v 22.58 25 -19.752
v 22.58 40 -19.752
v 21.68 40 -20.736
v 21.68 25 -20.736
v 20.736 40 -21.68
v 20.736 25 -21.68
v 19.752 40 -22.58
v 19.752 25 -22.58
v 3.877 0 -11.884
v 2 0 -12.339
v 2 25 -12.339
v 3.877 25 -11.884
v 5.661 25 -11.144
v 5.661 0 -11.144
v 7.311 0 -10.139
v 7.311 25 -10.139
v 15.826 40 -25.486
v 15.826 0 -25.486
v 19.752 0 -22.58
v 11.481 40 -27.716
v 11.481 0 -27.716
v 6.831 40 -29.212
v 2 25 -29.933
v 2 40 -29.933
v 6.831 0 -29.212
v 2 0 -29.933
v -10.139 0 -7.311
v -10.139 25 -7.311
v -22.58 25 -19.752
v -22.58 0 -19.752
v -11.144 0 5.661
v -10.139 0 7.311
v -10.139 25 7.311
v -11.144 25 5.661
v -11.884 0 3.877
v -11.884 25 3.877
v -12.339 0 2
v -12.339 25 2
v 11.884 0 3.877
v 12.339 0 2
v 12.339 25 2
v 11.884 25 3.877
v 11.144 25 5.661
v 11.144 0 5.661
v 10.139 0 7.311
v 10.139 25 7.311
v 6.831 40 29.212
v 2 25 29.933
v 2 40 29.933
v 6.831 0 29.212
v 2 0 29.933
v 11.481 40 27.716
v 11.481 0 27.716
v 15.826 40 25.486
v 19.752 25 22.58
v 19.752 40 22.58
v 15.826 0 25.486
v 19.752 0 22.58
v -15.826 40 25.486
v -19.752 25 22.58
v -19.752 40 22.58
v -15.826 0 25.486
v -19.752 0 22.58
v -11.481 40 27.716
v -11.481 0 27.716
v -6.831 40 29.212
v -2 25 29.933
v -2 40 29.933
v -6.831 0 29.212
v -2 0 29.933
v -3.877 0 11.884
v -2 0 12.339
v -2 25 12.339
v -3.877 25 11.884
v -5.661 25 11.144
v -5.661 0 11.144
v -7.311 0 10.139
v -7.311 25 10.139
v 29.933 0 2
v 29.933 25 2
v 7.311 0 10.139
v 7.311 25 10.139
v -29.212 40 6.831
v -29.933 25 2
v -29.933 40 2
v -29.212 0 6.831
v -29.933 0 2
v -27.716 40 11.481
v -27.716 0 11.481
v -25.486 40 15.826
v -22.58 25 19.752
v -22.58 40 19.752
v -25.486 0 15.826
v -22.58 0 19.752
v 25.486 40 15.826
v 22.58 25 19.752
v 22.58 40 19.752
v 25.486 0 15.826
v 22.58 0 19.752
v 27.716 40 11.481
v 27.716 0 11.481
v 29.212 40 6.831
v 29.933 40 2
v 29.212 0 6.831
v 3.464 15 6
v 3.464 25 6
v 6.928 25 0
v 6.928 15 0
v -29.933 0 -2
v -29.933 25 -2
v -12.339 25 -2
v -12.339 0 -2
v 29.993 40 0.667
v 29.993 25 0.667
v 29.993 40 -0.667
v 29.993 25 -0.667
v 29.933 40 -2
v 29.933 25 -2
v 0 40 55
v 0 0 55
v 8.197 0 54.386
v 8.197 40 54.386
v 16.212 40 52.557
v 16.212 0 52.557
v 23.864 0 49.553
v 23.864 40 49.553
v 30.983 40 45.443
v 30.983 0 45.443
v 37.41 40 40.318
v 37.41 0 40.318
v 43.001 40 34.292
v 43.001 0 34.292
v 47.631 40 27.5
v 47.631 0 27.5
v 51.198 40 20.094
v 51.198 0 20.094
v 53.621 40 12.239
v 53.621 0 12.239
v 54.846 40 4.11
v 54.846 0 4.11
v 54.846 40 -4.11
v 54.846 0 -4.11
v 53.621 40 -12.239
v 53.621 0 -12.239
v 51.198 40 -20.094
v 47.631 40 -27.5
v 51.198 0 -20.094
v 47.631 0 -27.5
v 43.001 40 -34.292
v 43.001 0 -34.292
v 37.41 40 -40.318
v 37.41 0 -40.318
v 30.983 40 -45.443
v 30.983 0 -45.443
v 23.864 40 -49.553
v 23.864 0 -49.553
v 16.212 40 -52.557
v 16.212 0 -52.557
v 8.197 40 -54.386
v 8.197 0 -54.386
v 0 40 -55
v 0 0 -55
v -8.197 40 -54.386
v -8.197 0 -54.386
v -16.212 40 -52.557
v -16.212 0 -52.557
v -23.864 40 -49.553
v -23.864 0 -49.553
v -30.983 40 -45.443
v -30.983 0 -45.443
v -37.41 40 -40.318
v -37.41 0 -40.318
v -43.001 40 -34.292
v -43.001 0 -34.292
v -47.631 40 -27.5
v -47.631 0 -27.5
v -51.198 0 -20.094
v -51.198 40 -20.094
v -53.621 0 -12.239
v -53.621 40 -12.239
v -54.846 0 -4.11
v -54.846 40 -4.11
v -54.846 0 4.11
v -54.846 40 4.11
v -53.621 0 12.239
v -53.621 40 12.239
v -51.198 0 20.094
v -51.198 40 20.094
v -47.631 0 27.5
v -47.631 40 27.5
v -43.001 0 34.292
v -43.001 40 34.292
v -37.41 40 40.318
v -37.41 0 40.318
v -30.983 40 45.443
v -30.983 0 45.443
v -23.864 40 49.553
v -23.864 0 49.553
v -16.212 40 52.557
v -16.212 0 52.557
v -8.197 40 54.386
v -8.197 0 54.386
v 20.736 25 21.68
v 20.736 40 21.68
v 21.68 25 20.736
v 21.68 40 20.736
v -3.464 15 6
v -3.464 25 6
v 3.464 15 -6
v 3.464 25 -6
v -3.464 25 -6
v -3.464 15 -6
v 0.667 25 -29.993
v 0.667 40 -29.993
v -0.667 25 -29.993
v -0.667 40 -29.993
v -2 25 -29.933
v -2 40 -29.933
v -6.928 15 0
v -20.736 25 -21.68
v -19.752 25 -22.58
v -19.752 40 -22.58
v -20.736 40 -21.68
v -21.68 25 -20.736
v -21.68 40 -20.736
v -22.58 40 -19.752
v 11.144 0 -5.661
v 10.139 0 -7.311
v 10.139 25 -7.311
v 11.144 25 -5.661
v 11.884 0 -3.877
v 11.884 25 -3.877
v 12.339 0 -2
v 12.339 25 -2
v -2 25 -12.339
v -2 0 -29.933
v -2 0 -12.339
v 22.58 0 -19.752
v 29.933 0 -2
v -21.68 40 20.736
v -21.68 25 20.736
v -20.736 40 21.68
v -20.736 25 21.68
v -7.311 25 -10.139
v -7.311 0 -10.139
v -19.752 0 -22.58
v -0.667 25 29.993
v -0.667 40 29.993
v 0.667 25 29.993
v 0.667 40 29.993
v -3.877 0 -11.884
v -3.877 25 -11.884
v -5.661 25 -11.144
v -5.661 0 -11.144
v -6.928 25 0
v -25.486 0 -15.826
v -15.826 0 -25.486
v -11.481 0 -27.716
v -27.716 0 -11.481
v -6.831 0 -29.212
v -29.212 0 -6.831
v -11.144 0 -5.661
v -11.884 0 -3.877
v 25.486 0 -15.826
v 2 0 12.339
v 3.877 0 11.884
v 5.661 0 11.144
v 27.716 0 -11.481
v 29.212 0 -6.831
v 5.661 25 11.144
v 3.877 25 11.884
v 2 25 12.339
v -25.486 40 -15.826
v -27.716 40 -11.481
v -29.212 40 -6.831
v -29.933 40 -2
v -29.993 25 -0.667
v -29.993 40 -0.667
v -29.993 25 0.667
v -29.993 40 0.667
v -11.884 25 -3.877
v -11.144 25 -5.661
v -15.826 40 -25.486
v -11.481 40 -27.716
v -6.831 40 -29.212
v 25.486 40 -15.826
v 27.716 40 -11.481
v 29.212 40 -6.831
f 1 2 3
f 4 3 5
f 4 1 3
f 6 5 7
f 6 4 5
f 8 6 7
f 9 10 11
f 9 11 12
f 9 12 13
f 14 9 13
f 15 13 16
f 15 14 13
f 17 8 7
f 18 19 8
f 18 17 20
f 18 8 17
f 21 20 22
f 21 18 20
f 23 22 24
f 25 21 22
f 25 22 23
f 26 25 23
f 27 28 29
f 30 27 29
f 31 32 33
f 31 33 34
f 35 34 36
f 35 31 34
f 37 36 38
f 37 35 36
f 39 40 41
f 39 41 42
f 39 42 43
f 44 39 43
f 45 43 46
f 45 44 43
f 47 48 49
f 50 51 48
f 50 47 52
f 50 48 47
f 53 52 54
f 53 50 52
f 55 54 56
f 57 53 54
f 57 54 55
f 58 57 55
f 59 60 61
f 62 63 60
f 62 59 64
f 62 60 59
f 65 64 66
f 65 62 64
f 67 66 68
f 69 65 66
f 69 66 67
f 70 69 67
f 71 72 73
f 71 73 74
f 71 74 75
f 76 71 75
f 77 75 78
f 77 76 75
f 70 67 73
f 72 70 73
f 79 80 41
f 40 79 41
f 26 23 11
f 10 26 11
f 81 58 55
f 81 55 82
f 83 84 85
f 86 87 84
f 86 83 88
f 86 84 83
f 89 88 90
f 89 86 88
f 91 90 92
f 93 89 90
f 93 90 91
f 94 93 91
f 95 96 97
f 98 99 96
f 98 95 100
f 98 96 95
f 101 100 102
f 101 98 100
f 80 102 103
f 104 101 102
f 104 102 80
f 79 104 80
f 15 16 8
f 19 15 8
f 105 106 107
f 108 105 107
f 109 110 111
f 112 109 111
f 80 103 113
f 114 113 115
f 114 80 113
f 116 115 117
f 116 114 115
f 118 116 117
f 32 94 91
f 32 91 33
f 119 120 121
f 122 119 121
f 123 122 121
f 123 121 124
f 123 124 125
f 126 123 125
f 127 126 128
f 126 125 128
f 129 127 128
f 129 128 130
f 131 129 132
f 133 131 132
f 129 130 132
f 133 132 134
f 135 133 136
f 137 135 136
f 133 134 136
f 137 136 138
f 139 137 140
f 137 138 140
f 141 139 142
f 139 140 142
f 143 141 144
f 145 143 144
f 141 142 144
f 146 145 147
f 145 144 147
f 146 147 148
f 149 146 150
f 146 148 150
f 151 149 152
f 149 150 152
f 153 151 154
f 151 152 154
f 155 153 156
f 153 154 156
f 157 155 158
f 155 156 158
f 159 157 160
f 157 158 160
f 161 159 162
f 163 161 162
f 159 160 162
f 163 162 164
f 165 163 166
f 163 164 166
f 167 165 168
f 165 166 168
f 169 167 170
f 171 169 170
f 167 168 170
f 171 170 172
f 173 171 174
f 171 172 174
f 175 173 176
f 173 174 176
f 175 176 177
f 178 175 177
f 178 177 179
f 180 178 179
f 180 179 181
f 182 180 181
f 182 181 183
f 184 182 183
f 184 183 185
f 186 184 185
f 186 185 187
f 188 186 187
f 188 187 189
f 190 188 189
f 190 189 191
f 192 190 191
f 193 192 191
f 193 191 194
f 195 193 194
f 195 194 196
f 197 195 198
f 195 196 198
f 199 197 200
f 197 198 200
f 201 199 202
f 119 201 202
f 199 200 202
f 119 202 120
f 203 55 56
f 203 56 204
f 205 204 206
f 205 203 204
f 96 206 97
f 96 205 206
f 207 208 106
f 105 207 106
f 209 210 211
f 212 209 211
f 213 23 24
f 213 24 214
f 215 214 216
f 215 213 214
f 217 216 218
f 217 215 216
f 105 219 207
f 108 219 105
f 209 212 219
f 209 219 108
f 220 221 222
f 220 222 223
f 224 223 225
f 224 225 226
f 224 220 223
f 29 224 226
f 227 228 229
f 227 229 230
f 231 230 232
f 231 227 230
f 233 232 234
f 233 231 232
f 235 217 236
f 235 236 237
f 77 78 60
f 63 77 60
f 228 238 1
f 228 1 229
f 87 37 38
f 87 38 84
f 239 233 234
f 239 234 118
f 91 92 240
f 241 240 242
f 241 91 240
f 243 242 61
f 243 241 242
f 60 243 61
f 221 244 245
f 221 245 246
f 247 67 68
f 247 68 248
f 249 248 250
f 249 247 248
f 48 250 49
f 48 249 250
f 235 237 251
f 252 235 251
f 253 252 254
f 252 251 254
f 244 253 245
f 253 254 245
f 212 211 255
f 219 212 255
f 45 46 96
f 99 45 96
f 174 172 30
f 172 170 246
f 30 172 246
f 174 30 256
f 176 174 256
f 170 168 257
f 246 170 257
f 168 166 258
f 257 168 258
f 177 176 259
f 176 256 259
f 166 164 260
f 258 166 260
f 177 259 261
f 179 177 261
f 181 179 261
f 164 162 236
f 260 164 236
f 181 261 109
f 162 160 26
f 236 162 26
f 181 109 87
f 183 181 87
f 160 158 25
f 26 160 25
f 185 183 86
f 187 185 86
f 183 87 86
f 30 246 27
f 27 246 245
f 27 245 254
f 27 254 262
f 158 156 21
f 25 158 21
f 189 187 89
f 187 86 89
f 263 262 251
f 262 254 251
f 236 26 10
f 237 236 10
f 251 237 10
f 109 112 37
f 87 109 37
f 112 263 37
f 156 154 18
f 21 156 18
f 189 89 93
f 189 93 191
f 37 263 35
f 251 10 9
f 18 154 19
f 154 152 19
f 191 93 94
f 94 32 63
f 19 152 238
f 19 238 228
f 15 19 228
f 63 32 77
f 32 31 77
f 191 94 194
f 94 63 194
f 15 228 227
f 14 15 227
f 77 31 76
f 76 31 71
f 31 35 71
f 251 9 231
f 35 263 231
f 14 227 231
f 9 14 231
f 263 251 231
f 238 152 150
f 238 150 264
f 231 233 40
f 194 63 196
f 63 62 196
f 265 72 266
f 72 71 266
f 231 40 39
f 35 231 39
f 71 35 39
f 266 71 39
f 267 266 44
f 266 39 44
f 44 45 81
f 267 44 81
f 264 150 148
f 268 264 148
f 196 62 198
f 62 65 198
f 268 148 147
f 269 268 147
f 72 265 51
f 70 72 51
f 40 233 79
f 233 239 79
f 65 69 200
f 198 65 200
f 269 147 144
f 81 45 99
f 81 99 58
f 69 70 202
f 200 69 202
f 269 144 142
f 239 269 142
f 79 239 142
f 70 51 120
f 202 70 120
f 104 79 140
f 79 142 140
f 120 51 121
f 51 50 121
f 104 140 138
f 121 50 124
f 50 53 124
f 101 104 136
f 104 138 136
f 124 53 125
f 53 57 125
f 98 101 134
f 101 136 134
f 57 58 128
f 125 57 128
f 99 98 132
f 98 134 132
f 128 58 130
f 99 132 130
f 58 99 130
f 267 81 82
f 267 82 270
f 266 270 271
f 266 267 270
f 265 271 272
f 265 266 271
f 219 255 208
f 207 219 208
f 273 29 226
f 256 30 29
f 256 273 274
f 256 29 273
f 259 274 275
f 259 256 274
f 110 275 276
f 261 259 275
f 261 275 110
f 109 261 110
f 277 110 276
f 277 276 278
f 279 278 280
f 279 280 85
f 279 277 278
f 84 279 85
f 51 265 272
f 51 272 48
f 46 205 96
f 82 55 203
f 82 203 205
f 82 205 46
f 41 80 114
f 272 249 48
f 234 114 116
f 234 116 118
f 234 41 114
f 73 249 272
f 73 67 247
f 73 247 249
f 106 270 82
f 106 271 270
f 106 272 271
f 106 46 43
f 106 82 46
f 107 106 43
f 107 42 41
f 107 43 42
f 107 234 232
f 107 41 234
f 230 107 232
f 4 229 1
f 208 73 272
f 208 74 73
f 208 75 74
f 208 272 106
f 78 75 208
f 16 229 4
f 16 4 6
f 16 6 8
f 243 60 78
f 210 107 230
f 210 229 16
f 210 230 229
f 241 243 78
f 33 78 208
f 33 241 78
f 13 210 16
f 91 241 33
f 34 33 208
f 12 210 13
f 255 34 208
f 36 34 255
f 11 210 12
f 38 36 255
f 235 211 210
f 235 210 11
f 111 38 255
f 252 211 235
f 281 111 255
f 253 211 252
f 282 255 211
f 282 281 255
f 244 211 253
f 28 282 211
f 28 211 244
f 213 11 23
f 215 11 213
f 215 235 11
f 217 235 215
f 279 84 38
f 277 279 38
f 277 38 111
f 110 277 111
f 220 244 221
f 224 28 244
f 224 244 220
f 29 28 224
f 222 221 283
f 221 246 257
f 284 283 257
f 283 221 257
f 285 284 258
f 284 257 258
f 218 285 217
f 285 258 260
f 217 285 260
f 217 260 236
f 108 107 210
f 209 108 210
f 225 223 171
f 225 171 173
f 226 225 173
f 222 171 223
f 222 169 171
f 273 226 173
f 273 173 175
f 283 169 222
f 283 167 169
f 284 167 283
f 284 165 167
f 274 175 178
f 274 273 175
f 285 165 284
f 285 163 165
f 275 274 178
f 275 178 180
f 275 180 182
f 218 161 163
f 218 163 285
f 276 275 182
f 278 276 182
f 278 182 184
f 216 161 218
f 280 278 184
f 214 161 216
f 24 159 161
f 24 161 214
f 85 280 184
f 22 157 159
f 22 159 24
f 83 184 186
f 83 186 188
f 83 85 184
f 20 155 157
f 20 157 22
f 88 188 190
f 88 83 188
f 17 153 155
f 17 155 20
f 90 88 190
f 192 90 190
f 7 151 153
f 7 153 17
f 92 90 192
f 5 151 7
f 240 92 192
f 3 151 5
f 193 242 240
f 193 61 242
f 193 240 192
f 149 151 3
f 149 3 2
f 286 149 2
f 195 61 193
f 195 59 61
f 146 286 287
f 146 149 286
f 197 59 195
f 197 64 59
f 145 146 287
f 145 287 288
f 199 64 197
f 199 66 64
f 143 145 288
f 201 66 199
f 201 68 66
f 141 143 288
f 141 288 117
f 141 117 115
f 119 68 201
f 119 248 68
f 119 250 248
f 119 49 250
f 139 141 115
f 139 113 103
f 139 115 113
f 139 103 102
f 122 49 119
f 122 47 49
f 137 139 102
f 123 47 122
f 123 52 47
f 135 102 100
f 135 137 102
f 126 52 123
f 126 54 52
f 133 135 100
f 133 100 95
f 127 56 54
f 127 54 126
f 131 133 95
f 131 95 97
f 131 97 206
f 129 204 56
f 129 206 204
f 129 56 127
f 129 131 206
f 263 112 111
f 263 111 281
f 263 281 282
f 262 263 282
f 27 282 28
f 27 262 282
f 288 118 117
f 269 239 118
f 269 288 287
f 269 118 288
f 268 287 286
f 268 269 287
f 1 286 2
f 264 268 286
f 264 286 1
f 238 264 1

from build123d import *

# Parameters (mm, degrees)
SKETCH2_R           = 55
WHEEL_EXTRUDE_DEPTH = 40
WHEEL_INSET_START   = -15
SKETCH4_R           = 30
WHEEL_INSET_DEPTH   = 15
HUB_INSET_DEPTH     = 25


with BuildPart() as part:
    # Sketch2 → Wheel_Extrude (new body)
    with BuildSketch(Plane(origin=(0, 0, 0), x_dir=(1, 0, 0), z_dir=(0, 1, 0))):
        Circle(SKETCH2_R)
        with BuildLine():
            Line((2, 29.933259094), (2, 12.338962679))
            ThreePointArc((2, 12.338962679), (4.783542905, 11.548494156), (7.310750621, 10.139177746))
            Line((7.310750621, 10.139177746), (19.751796926, 22.580224051))
            ThreePointArc((19.751796926, 22.580224051), (11.480502971, 27.716385975), (2, 29.933259094))
        make_face(mode=Mode.SUBTRACT)
        with BuildLine():
            Line((-2, 29.933259094), (-2, 12.338962679))
            ThreePointArc((-2, 12.338962679), (-4.783542905, 11.548494156), (-7.310750621, 10.139177746))
            Line((-7.310750621, 10.139177746), (-19.751796926, 22.580224051))
            ThreePointArc((-19.751796926, 22.580224051), (-11.480502971, 27.716385975), (-2, 29.933259094))
        make_face(mode=Mode.SUBTRACT)
        with BuildLine():
            Line((22.580224051, 19.751796926), (10.139177746, 7.310750621))
            ThreePointArc((10.139177746, 7.310750621), (11.548494156, 4.783542905), (12.338962679, 2))
            Line((12.338962679, 2), (29.933259094, 2))
            ThreePointArc((29.933259094, 2), (27.716385975, 11.480502971), (22.580224051, 19.751796926))
        make_face(mode=Mode.SUBTRACT)
        with BuildLine():
            Line((29.933259094, -2), (12.338962679, -2))
            ThreePointArc((12.338962679, -2), (11.548494156, -4.783542905), (10.139177746, -7.310750621))
            Line((10.139177746, -7.310750621), (22.580224051, -19.751796926))
            ThreePointArc((22.580224051, -19.751796926), (27.716385975, -11.480502971), (29.933259094, -2))
        make_face(mode=Mode.SUBTRACT)
        with BuildLine():
            Line((19.751796926, -22.580224051), (7.310750621, -10.139177746))
            ThreePointArc((7.310750621, -10.139177746), (4.783542905, -11.548494156), (2, -12.338962679))
            Line((2, -12.338962679), (2, -29.933259094))
            ThreePointArc((2, -29.933259094), (11.480502971, -27.716385975), (19.751796926, -22.580224051))
        make_face(mode=Mode.SUBTRACT)
        with BuildLine():
            Line((-2, -29.933259094), (-2, -12.338962679))
            ThreePointArc((-2, -12.338962679), (-4.783542905, -11.548494156), (-7.310750621, -10.139177746))
            Line((-7.310750621, -10.139177746), (-19.751796926, -22.580224051))
            ThreePointArc((-19.751796926, -22.580224051), (-11.480502971, -27.716385975), (-2, -29.933259094))
        make_face(mode=Mode.SUBTRACT)
        with BuildLine():
            Line((-22.580224051, -19.751796926), (-10.139177746, -7.310750621))
            ThreePointArc((-10.139177746, -7.310750621), (-11.548494156, -4.783542905), (-12.338962679, -2))
            Line((-12.338962679, -2), (-29.933259094, -2))
            ThreePointArc((-29.933259094, -2), (-27.716385975, -11.480502971), (-22.580224051, -19.751796926))
        make_face(mode=Mode.SUBTRACT)
        with BuildLine():
            Line((-29.933259094, 2), (-12.338962679, 2))
            ThreePointArc((-12.338962679, 2), (-11.548494156, 4.783542905), (-10.139177746, 7.310750621))
            Line((-10.139177746, 7.310750621), (-22.580224051, 19.751796926))
            ThreePointArc((-22.580224051, 19.751796926), (-27.716385975, 11.480502971), (-29.933259094, 2))
        make_face(mode=Mode.SUBTRACT)
    extrude(amount=WHEEL_EXTRUDE_DEPTH)

    # Sketch4 → Wheel_Inset (cut)
    with BuildSketch(Plane(origin=(0, 40, 0), x_dir=(1, 0, 0), z_dir=(0, 1, 0)).offset(WHEEL_INSET_START)):
        Circle(SKETCH4_R)
    extrude(amount=WHEEL_INSET_DEPTH, mode=Mode.SUBTRACT)

    # Sketch4<4> → Hub_Inset (cut)
    with BuildSketch(Plane(origin=(0, 40, 0), x_dir=(1, 0, 0), z_dir=(0, 1, 0))):
        Polygon((6.92820323, 0), (3.464101615, 6), (-3.464101615, 6), (-6.92820323, 0), (-3.464101615, -6), (3.464101615, -6), align=None)
    extrude(amount=-HUB_INSET_DEPTH, mode=Mode.SUBTRACT)


solid = part.part
